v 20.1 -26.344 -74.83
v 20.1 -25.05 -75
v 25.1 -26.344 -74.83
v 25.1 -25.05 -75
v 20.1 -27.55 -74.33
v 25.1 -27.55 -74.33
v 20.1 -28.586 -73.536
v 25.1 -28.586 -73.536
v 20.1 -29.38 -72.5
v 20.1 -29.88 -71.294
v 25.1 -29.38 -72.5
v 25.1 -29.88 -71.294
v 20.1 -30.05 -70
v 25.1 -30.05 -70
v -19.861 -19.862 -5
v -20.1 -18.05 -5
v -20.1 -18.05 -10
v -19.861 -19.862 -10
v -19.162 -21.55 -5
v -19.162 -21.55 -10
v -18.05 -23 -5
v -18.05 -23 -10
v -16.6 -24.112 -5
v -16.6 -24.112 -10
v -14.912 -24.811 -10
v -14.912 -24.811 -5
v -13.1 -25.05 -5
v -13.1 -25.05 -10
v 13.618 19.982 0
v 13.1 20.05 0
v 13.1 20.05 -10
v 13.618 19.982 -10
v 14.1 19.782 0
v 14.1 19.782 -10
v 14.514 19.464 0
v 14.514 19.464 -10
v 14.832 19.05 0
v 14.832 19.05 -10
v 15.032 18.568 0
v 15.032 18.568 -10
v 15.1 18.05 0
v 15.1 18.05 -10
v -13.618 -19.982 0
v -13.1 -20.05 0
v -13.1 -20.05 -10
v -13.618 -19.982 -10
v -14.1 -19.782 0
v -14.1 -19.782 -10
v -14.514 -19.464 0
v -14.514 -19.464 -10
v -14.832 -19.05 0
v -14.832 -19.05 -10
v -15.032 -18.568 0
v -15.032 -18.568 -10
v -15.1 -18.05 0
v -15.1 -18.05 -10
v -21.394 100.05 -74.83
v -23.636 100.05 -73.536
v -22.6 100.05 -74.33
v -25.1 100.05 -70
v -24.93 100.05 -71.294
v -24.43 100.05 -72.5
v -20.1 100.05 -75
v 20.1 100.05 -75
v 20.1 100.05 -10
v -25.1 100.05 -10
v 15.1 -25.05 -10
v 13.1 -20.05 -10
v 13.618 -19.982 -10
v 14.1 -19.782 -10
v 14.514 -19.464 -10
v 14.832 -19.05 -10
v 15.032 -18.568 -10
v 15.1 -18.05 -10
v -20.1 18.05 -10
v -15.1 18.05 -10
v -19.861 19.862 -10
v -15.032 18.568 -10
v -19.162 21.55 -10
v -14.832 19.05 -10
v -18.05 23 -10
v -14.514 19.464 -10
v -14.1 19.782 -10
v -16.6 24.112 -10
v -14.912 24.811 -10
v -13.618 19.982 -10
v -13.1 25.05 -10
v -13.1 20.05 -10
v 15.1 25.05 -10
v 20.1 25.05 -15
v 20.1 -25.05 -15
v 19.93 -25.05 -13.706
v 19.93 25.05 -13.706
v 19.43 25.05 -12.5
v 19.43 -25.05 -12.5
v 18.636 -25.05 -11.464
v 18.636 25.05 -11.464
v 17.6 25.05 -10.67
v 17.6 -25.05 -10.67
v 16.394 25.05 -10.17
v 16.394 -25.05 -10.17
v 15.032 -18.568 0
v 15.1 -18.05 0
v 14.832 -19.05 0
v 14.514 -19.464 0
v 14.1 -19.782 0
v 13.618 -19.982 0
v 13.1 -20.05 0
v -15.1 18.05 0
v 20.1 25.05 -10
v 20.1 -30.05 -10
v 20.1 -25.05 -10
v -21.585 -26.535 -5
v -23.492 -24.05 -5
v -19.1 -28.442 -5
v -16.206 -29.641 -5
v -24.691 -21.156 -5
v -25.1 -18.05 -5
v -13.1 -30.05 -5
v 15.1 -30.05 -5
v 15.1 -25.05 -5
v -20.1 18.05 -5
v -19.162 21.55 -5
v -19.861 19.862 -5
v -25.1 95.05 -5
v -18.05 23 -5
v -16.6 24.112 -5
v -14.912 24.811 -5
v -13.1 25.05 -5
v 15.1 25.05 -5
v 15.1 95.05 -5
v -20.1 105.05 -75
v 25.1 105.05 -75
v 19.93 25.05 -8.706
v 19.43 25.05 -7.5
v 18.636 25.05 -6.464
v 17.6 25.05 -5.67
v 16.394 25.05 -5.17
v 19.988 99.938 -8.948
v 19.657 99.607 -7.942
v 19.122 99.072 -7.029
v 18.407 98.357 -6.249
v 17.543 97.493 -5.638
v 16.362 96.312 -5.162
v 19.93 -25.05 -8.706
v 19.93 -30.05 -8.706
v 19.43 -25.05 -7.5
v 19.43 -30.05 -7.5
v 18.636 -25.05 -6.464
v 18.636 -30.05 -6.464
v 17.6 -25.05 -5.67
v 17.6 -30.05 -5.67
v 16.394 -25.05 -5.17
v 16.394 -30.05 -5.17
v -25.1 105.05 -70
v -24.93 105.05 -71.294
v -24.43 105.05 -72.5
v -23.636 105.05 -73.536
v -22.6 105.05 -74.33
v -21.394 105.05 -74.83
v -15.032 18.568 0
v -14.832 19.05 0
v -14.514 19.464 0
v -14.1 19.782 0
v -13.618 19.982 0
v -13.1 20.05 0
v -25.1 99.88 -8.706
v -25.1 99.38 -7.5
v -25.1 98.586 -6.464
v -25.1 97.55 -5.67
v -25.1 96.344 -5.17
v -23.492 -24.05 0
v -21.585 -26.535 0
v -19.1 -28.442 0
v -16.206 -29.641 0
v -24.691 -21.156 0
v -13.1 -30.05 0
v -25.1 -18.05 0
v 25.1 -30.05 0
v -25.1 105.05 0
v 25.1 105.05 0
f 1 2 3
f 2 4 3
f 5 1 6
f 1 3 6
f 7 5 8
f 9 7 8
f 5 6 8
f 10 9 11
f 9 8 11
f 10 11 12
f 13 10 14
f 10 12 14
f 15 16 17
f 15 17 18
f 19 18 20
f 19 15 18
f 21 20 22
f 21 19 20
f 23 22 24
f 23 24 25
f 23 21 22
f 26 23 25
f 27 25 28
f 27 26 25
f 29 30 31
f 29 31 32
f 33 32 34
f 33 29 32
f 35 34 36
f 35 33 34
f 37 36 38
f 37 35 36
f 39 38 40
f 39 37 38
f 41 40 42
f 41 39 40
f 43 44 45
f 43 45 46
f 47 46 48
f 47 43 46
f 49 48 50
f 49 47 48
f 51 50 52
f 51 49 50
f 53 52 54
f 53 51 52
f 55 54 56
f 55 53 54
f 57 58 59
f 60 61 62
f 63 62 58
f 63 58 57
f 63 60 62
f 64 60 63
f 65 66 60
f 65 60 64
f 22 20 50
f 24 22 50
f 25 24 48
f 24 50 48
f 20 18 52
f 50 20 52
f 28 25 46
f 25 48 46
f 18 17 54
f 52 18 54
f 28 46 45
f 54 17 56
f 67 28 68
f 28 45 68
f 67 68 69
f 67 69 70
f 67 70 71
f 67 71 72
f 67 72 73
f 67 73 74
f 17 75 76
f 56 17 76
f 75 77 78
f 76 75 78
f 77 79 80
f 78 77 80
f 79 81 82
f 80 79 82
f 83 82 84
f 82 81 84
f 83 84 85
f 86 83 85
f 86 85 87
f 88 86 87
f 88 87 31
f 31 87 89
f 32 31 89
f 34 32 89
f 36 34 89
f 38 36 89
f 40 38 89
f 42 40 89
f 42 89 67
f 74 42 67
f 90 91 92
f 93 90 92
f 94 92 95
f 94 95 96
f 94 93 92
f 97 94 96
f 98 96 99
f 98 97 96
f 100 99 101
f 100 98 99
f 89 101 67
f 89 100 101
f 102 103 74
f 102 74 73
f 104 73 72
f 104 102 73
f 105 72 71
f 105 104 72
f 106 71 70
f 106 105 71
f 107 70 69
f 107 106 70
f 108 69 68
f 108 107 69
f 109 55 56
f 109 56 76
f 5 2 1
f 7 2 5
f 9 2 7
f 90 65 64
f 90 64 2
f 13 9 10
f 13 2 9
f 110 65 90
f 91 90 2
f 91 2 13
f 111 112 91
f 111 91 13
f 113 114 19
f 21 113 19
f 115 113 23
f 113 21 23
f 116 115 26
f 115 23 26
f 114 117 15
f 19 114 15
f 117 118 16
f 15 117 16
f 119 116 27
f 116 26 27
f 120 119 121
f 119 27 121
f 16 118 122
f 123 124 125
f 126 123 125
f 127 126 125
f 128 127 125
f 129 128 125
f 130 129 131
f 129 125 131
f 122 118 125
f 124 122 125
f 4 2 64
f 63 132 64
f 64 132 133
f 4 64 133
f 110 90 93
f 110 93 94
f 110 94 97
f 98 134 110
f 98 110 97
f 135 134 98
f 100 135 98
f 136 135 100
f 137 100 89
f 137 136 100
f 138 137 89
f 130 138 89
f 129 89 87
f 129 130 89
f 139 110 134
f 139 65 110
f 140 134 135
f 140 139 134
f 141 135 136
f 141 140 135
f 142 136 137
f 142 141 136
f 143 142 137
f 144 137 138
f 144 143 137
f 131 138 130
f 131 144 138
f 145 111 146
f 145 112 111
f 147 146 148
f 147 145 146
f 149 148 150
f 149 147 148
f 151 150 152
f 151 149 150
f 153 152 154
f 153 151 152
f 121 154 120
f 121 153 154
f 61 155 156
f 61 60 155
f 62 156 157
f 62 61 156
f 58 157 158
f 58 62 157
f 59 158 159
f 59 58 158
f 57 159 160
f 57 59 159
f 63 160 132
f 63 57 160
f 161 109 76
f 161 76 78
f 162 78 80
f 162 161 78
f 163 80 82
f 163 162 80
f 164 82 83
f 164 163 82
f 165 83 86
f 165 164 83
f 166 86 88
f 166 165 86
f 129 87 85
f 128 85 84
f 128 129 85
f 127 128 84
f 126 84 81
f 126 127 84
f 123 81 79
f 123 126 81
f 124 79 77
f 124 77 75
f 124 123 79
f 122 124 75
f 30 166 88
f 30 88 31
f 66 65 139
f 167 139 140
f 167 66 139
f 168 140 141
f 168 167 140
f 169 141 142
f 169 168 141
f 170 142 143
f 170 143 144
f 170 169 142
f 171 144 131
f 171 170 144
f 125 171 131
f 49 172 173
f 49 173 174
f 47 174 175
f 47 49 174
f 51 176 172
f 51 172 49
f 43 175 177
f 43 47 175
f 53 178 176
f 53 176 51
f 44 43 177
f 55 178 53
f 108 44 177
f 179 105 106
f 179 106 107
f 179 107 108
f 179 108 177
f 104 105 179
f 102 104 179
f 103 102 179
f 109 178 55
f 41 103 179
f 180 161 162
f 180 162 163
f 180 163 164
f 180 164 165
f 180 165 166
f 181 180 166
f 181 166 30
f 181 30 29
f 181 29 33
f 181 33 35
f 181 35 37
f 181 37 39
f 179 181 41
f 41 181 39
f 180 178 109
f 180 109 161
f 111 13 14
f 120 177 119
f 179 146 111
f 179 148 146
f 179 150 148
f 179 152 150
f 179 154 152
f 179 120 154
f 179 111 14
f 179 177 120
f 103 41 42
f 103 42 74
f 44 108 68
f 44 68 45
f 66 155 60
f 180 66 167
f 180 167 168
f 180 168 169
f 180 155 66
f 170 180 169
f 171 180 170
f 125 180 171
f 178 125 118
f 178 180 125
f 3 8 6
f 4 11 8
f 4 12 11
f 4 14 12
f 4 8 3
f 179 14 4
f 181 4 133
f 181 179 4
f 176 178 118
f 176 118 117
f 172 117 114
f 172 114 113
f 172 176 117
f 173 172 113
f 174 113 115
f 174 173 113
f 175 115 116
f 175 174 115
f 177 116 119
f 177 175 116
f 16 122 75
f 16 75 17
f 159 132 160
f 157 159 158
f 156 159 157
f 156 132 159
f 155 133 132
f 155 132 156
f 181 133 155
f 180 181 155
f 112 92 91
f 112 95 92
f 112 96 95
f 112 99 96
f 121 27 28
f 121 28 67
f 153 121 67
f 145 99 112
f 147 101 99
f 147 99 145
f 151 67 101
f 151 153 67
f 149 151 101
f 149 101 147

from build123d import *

# Parameters (mm, degrees)
F1_DEPTH = 5
F2_DEPTH = 10
F3_DEPTH = 75
F4_R     = 4.99999


# Not quite as in the source:
# - a fillet or chamfer is up to 0.001 mm smaller than in the source, because OpenCascade refuses the exact size


with BuildPart() as f1:
    # F0 (on Top) → F1 (new body)
    with BuildSketch(Plane.XY):
        with BuildLine():
            ThreePointArc((-20.1, 18.05), (-18.0497474683, 22.9997474683), (-13.1, 25.05))
            Line((-13.1, 25.05), (20.1, 25.05))
            Line((20.1, 25.05), (20.1, 100.05))
            Line((20.1, 100.05), (-25.1, 100.05))
            Line((-25.1, 100.05), (-25.1, -18.05))
            ThreePointArc((-25.1, -18.05), (-21.5852813742, -26.5352813742), (-13.1, -30.05))
            Line((-13.1, -30.05), (20.1, -30.05))
            Line((20.1, -30.05), (20.1, -25.05))
            Line((20.1, -25.05), (-13.1, -25.05))
            ThreePointArc((-13.1, -25.05), (-18.0497474683, -22.9997474683), (-20.1, -18.05))
            Line((-20.1, -18.05), (-20.1, 18.05))
        make_face()
    extrude(amount=-F1_DEPTH)

    # F0 (on Top) → F2 (join)
    with BuildSketch(Plane.XY):
        with BuildLine():
            Line((20.1, 25.05), (-13.1, 25.05))
            ThreePointArc((-13.1, 25.05), (-18.0497474683, 22.9997474683), (-20.1, 18.05))
            Line((-20.1, 18.05), (-20.1, -18.05))
            ThreePointArc((-20.1, -18.05), (-18.0497474683, -22.9997474683), (-13.1, -25.05))
            Line((-13.1, -25.05), (20.1, -25.05))
            Line((20.1, -25.05), (20.1, 25.05))
        make_face()
        with BuildLine():
            Line((-13.1, 20.05), (13.1, 20.05))
            ThreePointArc((13.1, 20.05), (14.5142135624, 19.4642135624), (15.1, 18.05))
            Line((15.1, 18.05), (15.1, -18.05))
            ThreePointArc((15.1, -18.05), (14.5142135624, -19.4642135624), (13.1, -20.05))
            Line((13.1, -20.05), (-13.1, -20.05))
            ThreePointArc((-13.1, -20.05), (-14.5142135624, -19.4642135624), (-15.1, -18.05))
            Line((-15.1, -18.05), (-15.1, 18.05))
            ThreePointArc((-15.1, 18.05), (-14.5142135624, 19.4642135624), (-13.1, 20.05))
        make_face(mode=Mode.SUBTRACT)
    extrude(amount=-F2_DEPTH)

    # F0 (on Top) → F3 (join)
    with BuildSketch(Plane.XY):
        Polygon((20.1, 100.05), (20.1, 25.05), (20.1, -25.05), (20.1, -30.05), (25.1, -30.05), (25.1, 105.05), (-25.1, 105.05), (-25.1, 100.05), align=None)
    extrude(amount=-F3_DEPTH)

    # F4 (radius 5 in the source; OpenCascade refuses exactly that, so slightly less here)
    f4_edges = [f1.edges().sort_by_distance(p)[0] for p in [
        (20.1, -27.55, -5),
        (20.1, 62.55, -5),
        (20.1, 0, -10),
        (22.6, -30.05, -75),
        (-25.1, 102.55, -75),
        (-2.5, 100.05, -5),
    ]]
    fillet(f4_edges, radius=F4_R)


solid = f1.part
